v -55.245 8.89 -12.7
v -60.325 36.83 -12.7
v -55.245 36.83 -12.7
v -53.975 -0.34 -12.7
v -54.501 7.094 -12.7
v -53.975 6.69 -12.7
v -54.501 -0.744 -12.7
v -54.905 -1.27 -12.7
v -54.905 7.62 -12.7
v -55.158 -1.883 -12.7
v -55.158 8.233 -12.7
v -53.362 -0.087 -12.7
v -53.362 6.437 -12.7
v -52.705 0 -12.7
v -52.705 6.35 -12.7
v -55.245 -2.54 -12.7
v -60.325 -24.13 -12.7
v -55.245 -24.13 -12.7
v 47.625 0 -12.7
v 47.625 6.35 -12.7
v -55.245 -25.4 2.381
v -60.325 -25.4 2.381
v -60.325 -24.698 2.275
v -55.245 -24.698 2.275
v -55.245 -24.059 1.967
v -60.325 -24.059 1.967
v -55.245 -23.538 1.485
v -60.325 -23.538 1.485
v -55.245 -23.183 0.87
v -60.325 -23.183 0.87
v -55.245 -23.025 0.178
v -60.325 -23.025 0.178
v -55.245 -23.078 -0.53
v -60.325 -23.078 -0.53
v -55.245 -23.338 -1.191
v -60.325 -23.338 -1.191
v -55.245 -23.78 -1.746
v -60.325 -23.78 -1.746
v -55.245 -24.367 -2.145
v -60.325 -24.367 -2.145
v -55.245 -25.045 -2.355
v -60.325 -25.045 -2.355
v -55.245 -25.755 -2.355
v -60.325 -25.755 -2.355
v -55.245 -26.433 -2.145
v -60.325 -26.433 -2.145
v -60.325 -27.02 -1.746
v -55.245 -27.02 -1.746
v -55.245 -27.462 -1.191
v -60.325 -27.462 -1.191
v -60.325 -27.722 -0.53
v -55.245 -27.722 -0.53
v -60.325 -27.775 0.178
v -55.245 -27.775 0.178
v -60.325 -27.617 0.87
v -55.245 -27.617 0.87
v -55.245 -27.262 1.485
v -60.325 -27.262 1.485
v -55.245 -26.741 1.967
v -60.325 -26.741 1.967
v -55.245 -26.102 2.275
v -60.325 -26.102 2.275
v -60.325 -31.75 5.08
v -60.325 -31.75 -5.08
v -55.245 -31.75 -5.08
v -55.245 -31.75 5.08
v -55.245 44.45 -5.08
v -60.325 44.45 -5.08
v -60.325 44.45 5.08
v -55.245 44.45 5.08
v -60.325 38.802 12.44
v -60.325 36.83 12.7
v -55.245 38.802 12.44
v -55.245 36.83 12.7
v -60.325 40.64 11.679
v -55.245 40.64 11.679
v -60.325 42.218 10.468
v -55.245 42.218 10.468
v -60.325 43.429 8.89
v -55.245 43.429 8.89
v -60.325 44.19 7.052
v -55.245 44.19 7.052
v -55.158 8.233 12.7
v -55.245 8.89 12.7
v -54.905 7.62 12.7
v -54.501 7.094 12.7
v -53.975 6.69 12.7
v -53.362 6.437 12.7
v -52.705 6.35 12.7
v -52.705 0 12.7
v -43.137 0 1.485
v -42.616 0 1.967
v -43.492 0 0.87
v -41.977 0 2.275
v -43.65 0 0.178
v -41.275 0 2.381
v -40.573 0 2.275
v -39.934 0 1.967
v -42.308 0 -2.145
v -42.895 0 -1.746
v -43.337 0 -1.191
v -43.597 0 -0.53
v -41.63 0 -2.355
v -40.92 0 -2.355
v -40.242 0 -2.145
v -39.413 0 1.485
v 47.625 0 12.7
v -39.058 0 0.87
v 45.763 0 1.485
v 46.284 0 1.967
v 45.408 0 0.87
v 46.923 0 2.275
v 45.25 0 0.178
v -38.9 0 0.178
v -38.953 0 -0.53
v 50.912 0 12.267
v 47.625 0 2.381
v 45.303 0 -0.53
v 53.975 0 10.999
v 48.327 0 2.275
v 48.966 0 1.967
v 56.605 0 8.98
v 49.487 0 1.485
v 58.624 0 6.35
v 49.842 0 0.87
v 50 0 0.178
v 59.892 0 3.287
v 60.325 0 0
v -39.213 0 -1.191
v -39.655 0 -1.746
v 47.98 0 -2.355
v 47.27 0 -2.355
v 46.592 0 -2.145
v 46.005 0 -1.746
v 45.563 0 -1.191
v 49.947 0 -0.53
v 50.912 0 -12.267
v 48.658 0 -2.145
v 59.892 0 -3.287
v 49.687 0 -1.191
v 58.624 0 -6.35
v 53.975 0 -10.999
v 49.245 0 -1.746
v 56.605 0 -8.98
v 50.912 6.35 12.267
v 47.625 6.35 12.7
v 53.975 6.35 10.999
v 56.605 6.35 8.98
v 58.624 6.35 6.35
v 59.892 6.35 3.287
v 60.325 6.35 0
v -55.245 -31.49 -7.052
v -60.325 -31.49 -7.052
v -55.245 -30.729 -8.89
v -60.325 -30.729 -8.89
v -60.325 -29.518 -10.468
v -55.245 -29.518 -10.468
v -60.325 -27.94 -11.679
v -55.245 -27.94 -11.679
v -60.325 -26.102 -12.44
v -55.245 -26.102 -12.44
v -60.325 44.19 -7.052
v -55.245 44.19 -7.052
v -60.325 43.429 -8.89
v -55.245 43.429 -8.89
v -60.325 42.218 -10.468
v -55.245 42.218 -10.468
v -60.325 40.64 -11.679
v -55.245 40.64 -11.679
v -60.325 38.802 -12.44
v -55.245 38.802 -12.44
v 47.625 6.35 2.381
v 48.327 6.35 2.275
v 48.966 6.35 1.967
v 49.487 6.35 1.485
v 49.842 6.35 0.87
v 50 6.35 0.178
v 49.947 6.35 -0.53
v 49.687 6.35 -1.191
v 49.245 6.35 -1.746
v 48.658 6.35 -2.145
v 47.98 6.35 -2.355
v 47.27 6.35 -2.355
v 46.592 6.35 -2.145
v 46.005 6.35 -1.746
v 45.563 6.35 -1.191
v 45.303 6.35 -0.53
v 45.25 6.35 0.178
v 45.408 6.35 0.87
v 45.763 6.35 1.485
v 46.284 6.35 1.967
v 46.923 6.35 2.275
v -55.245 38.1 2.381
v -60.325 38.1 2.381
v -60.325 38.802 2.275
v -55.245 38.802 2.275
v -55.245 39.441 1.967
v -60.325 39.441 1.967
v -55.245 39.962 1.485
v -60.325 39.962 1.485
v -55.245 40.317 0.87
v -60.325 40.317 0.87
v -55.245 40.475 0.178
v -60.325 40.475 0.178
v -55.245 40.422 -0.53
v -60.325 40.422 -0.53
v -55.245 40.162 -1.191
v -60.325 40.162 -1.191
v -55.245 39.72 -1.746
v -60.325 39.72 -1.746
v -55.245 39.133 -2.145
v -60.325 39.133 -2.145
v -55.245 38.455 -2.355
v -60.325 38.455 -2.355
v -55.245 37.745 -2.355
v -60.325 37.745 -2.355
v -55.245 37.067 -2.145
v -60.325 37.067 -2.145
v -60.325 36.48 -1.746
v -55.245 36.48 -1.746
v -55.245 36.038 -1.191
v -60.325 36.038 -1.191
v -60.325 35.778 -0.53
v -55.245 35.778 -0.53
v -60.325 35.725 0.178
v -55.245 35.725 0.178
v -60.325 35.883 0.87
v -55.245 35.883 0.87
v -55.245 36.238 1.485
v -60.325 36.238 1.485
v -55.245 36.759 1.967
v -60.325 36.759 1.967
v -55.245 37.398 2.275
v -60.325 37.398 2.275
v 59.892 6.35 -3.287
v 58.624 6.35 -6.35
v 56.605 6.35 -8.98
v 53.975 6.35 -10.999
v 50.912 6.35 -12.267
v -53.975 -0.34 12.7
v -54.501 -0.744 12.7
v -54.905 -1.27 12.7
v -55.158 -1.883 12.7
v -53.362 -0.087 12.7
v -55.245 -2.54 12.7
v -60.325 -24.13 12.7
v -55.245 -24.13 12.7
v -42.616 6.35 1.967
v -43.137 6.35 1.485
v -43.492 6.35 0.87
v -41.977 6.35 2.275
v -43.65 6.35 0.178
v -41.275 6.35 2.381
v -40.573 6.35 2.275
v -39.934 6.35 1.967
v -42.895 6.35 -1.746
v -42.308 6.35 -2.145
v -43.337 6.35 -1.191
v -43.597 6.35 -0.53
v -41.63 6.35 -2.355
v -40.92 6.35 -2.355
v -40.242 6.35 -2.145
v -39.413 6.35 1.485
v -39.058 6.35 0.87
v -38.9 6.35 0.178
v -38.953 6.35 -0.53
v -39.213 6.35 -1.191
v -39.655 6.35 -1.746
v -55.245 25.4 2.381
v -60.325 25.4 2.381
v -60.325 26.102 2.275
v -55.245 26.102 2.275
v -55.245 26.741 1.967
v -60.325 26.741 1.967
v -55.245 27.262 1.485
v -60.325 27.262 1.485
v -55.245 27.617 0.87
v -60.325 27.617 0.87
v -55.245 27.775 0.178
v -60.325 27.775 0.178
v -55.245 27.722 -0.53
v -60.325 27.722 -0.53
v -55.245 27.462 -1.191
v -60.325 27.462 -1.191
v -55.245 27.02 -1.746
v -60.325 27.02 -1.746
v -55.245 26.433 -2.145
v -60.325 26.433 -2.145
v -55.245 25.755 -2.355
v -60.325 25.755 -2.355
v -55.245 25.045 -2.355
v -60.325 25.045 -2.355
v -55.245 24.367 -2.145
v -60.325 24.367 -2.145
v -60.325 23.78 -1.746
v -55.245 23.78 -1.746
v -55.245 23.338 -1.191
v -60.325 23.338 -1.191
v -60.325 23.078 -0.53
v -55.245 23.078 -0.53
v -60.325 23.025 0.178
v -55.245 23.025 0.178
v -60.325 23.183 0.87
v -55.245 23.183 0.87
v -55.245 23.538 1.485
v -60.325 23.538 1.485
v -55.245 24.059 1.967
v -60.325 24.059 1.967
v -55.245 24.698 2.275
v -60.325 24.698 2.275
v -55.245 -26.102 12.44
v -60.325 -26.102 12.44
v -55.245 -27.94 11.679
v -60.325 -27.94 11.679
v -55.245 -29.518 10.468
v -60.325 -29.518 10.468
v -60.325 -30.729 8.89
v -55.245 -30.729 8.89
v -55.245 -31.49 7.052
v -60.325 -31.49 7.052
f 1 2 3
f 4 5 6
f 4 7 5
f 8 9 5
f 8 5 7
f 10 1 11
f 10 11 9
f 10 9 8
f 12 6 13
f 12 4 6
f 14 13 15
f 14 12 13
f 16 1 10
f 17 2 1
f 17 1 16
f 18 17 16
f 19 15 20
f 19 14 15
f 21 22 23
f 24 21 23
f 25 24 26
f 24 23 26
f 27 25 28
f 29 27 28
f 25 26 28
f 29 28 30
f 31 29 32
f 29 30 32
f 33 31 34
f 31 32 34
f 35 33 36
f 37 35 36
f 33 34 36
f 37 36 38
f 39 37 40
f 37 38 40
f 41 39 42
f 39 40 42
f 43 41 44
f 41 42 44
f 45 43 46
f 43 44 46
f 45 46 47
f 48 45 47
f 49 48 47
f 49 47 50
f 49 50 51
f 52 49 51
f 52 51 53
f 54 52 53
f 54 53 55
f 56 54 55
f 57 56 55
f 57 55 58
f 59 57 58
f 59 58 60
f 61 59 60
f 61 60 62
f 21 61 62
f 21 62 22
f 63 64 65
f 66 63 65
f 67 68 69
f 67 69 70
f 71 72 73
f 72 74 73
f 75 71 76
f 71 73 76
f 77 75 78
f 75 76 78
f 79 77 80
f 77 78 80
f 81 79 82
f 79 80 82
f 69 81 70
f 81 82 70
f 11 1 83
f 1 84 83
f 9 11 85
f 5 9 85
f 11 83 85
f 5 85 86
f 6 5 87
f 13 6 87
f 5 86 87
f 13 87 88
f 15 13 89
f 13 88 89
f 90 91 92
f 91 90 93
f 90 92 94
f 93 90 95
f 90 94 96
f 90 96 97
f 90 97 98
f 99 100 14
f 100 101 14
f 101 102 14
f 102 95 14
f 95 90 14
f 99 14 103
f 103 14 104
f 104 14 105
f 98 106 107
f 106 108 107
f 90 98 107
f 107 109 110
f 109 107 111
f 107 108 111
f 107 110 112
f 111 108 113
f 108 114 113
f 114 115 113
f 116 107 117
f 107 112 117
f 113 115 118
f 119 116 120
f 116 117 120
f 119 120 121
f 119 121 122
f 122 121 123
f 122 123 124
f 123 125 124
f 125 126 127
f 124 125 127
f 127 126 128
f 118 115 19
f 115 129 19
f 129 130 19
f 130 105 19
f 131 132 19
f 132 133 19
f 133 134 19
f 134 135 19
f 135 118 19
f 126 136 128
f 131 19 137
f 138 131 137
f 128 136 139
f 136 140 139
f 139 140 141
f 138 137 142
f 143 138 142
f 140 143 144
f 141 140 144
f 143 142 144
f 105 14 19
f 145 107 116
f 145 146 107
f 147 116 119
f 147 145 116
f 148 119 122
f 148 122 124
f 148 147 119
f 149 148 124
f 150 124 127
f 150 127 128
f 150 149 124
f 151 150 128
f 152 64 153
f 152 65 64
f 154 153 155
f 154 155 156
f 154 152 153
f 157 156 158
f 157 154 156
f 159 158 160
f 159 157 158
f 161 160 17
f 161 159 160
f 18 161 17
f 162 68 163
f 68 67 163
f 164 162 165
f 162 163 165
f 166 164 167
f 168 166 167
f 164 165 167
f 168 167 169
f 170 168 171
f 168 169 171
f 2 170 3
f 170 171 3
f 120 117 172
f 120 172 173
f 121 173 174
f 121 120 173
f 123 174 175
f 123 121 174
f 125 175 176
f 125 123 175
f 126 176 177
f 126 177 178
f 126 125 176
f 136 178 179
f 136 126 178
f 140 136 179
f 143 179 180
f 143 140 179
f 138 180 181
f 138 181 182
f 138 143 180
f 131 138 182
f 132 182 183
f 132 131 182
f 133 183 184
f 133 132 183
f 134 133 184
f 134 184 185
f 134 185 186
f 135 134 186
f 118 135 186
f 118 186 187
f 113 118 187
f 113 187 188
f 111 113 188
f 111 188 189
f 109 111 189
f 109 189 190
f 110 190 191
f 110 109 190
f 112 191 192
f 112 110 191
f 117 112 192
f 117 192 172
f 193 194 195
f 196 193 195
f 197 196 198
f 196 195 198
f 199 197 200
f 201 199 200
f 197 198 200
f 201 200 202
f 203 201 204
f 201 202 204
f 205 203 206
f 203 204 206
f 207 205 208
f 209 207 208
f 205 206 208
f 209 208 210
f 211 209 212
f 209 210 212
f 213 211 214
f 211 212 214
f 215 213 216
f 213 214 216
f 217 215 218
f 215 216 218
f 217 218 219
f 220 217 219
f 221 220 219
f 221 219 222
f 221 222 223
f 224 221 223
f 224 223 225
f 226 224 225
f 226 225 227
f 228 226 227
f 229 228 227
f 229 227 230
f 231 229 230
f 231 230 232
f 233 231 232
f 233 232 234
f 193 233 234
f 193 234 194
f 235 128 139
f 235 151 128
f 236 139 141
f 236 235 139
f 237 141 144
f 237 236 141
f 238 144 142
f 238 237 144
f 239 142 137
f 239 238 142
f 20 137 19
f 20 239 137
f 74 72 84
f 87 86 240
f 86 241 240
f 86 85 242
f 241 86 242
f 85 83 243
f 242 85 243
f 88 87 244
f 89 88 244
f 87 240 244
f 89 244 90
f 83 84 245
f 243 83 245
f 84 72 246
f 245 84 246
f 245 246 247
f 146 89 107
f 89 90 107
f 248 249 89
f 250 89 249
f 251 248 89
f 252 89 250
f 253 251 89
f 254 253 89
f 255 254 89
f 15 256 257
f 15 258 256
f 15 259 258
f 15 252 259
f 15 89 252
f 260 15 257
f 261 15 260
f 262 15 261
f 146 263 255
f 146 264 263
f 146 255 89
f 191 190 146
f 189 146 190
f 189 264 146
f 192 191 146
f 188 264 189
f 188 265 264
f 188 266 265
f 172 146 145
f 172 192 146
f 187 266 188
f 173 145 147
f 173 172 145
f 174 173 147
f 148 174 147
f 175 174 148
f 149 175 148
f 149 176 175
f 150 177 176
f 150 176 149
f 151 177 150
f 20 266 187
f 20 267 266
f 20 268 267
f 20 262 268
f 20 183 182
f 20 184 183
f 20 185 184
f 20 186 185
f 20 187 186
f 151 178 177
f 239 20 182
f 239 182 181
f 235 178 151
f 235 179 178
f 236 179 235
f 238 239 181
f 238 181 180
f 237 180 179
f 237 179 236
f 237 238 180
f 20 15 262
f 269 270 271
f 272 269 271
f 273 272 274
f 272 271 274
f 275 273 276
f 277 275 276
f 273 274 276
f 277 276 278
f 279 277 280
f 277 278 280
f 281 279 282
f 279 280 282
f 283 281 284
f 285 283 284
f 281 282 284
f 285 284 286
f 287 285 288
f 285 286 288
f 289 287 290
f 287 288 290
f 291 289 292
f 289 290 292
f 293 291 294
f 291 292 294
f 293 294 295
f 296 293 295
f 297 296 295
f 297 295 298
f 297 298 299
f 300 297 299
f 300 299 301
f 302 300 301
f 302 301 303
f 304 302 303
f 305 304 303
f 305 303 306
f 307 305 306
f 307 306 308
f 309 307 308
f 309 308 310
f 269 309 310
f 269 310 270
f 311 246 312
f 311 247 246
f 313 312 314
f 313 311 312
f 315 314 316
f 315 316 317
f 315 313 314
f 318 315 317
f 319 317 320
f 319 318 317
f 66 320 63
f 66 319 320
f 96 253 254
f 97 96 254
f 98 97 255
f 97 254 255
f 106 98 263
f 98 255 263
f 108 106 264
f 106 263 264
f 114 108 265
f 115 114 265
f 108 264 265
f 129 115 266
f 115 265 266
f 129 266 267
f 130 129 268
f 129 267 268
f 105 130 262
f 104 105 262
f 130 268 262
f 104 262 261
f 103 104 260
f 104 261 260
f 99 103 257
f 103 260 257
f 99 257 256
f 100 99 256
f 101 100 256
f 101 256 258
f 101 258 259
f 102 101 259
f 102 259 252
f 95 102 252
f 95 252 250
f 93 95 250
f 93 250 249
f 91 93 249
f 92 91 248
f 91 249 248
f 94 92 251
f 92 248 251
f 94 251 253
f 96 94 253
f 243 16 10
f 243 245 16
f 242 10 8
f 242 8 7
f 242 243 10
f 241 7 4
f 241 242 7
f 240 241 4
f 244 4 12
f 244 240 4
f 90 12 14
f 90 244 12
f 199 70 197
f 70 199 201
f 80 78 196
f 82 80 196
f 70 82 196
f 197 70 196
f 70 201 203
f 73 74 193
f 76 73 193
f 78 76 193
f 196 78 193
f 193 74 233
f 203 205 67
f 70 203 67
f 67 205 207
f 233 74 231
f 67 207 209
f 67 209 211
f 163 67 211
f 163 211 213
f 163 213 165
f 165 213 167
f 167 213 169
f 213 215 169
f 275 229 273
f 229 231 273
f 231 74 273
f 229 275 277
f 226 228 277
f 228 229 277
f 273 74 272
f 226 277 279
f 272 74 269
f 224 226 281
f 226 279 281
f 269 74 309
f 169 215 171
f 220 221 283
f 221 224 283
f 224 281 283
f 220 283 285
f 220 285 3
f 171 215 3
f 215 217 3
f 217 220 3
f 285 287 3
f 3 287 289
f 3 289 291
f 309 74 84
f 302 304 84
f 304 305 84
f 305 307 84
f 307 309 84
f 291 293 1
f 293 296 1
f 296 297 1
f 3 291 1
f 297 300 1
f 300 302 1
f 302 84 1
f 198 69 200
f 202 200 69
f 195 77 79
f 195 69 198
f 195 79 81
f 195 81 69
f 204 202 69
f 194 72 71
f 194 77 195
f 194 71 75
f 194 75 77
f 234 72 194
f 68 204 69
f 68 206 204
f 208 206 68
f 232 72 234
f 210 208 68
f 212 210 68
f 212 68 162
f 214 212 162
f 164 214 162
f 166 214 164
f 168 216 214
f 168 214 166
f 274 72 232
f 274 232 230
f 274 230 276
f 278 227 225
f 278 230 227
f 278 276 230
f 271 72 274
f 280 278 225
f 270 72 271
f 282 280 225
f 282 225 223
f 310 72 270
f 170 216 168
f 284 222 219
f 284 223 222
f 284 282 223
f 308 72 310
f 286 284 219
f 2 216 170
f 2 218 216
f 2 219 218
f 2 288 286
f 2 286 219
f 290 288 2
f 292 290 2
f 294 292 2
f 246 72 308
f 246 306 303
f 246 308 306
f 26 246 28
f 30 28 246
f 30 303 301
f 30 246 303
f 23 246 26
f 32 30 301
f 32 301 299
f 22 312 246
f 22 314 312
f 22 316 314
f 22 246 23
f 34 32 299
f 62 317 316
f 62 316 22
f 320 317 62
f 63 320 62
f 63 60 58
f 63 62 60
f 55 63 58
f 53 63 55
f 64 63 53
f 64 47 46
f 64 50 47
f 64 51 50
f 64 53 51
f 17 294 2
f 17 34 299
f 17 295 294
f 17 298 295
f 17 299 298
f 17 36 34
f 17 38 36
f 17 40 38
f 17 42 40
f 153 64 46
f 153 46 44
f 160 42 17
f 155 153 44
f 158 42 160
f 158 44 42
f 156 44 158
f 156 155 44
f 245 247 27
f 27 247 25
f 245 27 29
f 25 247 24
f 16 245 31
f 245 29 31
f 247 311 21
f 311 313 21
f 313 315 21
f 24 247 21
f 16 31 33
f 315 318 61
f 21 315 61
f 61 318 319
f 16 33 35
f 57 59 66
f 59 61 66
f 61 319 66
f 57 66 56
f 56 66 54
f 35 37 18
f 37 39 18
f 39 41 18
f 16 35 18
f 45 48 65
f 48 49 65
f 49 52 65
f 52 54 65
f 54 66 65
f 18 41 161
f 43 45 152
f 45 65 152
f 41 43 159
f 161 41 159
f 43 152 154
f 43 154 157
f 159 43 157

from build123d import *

# Parameters (mm, degrees)
SKETCH1_W                = 120.65
SKETCH1_H                = 25.4
SKETCH1_R                = 2.38125
BOSS_EXTRUDE1_DEPTH      = 6.35
SKETCH2_R                = 2.38125
CUT_EXTRUDE1_DEPTH       = 6.35
BOSS_EXTRUDE2_DEPTH      = 38.1
BOSS_EXTRUDE2_DEPTH_BACK = 38.1
SKETCH3_W                = 5.08
SKETCH3_H                = 25.4
SKETCH4_R                = 2.38125
CUT_EXTRUDE2_DEPTH       = 130.203386179
FILLET1_R                = 2.54
FILLET2_R                = 7.62
FILLET3_R                = 12.7


with BuildPart() as part:
    # Sketch1 → Boss-Extrude1 (new body)
    with BuildSketch(Plane(origin=(0, 0, 0), x_dir=(1, 0, 0), z_dir=(0, 1, 0))):
        Rectangle(SKETCH1_W, SKETCH1_H)
        with Locations(Location((47.625, 0, 0), (0, 0, 270))):
            Circle(SKETCH1_R, mode=Mode.SUBTRACT)
    extrude(amount=BOSS_EXTRUDE1_DEPTH)

    # Sketch2 → Cut-Extrude1 (cut)
    with BuildSketch(Plane(origin=(0, 6.35, 0), x_dir=(1, 0, 0), z_dir=(0, 1, 0))):
        with Locations(Location((-41.275, 0, 0), (0, 0, 270))):
            Circle(SKETCH2_R)
    extrude(amount=-CUT_EXTRUDE1_DEPTH, mode=Mode.SUBTRACT)

    # Sketch3 → Boss-Extrude2 (add, two sides: drawn at the far end of the back side and taken through both)
    with BuildSketch(Plane(origin=(0, 6.35, 0), x_dir=(1, 0, 0), z_dir=(0, 1, 0)).offset(-BOSS_EXTRUDE2_DEPTH_BACK)):
        with Locations((-57.785, 0)):
            Rectangle(SKETCH3_W, SKETCH3_H)
    extrude(amount=BOSS_EXTRUDE2_DEPTH + BOSS_EXTRUDE2_DEPTH_BACK)

    # Sketch4 → Cut-Extrude2 (cut, through all)
    with BuildSketch(Plane.ZY.offset(60.325)):
        with Locations((0, 25.4)):
            Circle(SKETCH4_R)
        with Locations((0, -25.4)):
            Circle(SKETCH4_R)
        with Locations((0, 38.1)):
            Circle(SKETCH4_R)
    extrude(amount=-CUT_EXTRUDE2_DEPTH, mode=Mode.SUBTRACT)

    # Fillet1
    fillet1_edges = [part.edges().sort_by_distance(p)[0] for p in [
        (-55.245, 0, 0),
        (-55.245, 6.35, 0),
    ]]
    fillet(fillet1_edges, radius=FILLET1_R)

    # Fillet2
    fillet2_edges = [part.edges().sort_by_distance(p)[0] for p in [
        (-57.785, -31.75, -12.7),
        (-57.785, -31.75, 12.7),
        (-57.785, 44.45, 12.7),
        (-57.785, 44.45, -12.7),
    ]]
    fillet(fillet2_edges, radius=FILLET2_R)

    # Fillet3
    fillet3_edges = [part.edges().sort_by_distance(p)[0] for p in [
        (60.325, 3.175, 12.7),
        (60.325, 3.175, -12.7),
    ]]
    fillet(fillet3_edges, radius=FILLET3_R - 0.0001)  # a hair under: the kernel refuses the full size


solid = part.part
